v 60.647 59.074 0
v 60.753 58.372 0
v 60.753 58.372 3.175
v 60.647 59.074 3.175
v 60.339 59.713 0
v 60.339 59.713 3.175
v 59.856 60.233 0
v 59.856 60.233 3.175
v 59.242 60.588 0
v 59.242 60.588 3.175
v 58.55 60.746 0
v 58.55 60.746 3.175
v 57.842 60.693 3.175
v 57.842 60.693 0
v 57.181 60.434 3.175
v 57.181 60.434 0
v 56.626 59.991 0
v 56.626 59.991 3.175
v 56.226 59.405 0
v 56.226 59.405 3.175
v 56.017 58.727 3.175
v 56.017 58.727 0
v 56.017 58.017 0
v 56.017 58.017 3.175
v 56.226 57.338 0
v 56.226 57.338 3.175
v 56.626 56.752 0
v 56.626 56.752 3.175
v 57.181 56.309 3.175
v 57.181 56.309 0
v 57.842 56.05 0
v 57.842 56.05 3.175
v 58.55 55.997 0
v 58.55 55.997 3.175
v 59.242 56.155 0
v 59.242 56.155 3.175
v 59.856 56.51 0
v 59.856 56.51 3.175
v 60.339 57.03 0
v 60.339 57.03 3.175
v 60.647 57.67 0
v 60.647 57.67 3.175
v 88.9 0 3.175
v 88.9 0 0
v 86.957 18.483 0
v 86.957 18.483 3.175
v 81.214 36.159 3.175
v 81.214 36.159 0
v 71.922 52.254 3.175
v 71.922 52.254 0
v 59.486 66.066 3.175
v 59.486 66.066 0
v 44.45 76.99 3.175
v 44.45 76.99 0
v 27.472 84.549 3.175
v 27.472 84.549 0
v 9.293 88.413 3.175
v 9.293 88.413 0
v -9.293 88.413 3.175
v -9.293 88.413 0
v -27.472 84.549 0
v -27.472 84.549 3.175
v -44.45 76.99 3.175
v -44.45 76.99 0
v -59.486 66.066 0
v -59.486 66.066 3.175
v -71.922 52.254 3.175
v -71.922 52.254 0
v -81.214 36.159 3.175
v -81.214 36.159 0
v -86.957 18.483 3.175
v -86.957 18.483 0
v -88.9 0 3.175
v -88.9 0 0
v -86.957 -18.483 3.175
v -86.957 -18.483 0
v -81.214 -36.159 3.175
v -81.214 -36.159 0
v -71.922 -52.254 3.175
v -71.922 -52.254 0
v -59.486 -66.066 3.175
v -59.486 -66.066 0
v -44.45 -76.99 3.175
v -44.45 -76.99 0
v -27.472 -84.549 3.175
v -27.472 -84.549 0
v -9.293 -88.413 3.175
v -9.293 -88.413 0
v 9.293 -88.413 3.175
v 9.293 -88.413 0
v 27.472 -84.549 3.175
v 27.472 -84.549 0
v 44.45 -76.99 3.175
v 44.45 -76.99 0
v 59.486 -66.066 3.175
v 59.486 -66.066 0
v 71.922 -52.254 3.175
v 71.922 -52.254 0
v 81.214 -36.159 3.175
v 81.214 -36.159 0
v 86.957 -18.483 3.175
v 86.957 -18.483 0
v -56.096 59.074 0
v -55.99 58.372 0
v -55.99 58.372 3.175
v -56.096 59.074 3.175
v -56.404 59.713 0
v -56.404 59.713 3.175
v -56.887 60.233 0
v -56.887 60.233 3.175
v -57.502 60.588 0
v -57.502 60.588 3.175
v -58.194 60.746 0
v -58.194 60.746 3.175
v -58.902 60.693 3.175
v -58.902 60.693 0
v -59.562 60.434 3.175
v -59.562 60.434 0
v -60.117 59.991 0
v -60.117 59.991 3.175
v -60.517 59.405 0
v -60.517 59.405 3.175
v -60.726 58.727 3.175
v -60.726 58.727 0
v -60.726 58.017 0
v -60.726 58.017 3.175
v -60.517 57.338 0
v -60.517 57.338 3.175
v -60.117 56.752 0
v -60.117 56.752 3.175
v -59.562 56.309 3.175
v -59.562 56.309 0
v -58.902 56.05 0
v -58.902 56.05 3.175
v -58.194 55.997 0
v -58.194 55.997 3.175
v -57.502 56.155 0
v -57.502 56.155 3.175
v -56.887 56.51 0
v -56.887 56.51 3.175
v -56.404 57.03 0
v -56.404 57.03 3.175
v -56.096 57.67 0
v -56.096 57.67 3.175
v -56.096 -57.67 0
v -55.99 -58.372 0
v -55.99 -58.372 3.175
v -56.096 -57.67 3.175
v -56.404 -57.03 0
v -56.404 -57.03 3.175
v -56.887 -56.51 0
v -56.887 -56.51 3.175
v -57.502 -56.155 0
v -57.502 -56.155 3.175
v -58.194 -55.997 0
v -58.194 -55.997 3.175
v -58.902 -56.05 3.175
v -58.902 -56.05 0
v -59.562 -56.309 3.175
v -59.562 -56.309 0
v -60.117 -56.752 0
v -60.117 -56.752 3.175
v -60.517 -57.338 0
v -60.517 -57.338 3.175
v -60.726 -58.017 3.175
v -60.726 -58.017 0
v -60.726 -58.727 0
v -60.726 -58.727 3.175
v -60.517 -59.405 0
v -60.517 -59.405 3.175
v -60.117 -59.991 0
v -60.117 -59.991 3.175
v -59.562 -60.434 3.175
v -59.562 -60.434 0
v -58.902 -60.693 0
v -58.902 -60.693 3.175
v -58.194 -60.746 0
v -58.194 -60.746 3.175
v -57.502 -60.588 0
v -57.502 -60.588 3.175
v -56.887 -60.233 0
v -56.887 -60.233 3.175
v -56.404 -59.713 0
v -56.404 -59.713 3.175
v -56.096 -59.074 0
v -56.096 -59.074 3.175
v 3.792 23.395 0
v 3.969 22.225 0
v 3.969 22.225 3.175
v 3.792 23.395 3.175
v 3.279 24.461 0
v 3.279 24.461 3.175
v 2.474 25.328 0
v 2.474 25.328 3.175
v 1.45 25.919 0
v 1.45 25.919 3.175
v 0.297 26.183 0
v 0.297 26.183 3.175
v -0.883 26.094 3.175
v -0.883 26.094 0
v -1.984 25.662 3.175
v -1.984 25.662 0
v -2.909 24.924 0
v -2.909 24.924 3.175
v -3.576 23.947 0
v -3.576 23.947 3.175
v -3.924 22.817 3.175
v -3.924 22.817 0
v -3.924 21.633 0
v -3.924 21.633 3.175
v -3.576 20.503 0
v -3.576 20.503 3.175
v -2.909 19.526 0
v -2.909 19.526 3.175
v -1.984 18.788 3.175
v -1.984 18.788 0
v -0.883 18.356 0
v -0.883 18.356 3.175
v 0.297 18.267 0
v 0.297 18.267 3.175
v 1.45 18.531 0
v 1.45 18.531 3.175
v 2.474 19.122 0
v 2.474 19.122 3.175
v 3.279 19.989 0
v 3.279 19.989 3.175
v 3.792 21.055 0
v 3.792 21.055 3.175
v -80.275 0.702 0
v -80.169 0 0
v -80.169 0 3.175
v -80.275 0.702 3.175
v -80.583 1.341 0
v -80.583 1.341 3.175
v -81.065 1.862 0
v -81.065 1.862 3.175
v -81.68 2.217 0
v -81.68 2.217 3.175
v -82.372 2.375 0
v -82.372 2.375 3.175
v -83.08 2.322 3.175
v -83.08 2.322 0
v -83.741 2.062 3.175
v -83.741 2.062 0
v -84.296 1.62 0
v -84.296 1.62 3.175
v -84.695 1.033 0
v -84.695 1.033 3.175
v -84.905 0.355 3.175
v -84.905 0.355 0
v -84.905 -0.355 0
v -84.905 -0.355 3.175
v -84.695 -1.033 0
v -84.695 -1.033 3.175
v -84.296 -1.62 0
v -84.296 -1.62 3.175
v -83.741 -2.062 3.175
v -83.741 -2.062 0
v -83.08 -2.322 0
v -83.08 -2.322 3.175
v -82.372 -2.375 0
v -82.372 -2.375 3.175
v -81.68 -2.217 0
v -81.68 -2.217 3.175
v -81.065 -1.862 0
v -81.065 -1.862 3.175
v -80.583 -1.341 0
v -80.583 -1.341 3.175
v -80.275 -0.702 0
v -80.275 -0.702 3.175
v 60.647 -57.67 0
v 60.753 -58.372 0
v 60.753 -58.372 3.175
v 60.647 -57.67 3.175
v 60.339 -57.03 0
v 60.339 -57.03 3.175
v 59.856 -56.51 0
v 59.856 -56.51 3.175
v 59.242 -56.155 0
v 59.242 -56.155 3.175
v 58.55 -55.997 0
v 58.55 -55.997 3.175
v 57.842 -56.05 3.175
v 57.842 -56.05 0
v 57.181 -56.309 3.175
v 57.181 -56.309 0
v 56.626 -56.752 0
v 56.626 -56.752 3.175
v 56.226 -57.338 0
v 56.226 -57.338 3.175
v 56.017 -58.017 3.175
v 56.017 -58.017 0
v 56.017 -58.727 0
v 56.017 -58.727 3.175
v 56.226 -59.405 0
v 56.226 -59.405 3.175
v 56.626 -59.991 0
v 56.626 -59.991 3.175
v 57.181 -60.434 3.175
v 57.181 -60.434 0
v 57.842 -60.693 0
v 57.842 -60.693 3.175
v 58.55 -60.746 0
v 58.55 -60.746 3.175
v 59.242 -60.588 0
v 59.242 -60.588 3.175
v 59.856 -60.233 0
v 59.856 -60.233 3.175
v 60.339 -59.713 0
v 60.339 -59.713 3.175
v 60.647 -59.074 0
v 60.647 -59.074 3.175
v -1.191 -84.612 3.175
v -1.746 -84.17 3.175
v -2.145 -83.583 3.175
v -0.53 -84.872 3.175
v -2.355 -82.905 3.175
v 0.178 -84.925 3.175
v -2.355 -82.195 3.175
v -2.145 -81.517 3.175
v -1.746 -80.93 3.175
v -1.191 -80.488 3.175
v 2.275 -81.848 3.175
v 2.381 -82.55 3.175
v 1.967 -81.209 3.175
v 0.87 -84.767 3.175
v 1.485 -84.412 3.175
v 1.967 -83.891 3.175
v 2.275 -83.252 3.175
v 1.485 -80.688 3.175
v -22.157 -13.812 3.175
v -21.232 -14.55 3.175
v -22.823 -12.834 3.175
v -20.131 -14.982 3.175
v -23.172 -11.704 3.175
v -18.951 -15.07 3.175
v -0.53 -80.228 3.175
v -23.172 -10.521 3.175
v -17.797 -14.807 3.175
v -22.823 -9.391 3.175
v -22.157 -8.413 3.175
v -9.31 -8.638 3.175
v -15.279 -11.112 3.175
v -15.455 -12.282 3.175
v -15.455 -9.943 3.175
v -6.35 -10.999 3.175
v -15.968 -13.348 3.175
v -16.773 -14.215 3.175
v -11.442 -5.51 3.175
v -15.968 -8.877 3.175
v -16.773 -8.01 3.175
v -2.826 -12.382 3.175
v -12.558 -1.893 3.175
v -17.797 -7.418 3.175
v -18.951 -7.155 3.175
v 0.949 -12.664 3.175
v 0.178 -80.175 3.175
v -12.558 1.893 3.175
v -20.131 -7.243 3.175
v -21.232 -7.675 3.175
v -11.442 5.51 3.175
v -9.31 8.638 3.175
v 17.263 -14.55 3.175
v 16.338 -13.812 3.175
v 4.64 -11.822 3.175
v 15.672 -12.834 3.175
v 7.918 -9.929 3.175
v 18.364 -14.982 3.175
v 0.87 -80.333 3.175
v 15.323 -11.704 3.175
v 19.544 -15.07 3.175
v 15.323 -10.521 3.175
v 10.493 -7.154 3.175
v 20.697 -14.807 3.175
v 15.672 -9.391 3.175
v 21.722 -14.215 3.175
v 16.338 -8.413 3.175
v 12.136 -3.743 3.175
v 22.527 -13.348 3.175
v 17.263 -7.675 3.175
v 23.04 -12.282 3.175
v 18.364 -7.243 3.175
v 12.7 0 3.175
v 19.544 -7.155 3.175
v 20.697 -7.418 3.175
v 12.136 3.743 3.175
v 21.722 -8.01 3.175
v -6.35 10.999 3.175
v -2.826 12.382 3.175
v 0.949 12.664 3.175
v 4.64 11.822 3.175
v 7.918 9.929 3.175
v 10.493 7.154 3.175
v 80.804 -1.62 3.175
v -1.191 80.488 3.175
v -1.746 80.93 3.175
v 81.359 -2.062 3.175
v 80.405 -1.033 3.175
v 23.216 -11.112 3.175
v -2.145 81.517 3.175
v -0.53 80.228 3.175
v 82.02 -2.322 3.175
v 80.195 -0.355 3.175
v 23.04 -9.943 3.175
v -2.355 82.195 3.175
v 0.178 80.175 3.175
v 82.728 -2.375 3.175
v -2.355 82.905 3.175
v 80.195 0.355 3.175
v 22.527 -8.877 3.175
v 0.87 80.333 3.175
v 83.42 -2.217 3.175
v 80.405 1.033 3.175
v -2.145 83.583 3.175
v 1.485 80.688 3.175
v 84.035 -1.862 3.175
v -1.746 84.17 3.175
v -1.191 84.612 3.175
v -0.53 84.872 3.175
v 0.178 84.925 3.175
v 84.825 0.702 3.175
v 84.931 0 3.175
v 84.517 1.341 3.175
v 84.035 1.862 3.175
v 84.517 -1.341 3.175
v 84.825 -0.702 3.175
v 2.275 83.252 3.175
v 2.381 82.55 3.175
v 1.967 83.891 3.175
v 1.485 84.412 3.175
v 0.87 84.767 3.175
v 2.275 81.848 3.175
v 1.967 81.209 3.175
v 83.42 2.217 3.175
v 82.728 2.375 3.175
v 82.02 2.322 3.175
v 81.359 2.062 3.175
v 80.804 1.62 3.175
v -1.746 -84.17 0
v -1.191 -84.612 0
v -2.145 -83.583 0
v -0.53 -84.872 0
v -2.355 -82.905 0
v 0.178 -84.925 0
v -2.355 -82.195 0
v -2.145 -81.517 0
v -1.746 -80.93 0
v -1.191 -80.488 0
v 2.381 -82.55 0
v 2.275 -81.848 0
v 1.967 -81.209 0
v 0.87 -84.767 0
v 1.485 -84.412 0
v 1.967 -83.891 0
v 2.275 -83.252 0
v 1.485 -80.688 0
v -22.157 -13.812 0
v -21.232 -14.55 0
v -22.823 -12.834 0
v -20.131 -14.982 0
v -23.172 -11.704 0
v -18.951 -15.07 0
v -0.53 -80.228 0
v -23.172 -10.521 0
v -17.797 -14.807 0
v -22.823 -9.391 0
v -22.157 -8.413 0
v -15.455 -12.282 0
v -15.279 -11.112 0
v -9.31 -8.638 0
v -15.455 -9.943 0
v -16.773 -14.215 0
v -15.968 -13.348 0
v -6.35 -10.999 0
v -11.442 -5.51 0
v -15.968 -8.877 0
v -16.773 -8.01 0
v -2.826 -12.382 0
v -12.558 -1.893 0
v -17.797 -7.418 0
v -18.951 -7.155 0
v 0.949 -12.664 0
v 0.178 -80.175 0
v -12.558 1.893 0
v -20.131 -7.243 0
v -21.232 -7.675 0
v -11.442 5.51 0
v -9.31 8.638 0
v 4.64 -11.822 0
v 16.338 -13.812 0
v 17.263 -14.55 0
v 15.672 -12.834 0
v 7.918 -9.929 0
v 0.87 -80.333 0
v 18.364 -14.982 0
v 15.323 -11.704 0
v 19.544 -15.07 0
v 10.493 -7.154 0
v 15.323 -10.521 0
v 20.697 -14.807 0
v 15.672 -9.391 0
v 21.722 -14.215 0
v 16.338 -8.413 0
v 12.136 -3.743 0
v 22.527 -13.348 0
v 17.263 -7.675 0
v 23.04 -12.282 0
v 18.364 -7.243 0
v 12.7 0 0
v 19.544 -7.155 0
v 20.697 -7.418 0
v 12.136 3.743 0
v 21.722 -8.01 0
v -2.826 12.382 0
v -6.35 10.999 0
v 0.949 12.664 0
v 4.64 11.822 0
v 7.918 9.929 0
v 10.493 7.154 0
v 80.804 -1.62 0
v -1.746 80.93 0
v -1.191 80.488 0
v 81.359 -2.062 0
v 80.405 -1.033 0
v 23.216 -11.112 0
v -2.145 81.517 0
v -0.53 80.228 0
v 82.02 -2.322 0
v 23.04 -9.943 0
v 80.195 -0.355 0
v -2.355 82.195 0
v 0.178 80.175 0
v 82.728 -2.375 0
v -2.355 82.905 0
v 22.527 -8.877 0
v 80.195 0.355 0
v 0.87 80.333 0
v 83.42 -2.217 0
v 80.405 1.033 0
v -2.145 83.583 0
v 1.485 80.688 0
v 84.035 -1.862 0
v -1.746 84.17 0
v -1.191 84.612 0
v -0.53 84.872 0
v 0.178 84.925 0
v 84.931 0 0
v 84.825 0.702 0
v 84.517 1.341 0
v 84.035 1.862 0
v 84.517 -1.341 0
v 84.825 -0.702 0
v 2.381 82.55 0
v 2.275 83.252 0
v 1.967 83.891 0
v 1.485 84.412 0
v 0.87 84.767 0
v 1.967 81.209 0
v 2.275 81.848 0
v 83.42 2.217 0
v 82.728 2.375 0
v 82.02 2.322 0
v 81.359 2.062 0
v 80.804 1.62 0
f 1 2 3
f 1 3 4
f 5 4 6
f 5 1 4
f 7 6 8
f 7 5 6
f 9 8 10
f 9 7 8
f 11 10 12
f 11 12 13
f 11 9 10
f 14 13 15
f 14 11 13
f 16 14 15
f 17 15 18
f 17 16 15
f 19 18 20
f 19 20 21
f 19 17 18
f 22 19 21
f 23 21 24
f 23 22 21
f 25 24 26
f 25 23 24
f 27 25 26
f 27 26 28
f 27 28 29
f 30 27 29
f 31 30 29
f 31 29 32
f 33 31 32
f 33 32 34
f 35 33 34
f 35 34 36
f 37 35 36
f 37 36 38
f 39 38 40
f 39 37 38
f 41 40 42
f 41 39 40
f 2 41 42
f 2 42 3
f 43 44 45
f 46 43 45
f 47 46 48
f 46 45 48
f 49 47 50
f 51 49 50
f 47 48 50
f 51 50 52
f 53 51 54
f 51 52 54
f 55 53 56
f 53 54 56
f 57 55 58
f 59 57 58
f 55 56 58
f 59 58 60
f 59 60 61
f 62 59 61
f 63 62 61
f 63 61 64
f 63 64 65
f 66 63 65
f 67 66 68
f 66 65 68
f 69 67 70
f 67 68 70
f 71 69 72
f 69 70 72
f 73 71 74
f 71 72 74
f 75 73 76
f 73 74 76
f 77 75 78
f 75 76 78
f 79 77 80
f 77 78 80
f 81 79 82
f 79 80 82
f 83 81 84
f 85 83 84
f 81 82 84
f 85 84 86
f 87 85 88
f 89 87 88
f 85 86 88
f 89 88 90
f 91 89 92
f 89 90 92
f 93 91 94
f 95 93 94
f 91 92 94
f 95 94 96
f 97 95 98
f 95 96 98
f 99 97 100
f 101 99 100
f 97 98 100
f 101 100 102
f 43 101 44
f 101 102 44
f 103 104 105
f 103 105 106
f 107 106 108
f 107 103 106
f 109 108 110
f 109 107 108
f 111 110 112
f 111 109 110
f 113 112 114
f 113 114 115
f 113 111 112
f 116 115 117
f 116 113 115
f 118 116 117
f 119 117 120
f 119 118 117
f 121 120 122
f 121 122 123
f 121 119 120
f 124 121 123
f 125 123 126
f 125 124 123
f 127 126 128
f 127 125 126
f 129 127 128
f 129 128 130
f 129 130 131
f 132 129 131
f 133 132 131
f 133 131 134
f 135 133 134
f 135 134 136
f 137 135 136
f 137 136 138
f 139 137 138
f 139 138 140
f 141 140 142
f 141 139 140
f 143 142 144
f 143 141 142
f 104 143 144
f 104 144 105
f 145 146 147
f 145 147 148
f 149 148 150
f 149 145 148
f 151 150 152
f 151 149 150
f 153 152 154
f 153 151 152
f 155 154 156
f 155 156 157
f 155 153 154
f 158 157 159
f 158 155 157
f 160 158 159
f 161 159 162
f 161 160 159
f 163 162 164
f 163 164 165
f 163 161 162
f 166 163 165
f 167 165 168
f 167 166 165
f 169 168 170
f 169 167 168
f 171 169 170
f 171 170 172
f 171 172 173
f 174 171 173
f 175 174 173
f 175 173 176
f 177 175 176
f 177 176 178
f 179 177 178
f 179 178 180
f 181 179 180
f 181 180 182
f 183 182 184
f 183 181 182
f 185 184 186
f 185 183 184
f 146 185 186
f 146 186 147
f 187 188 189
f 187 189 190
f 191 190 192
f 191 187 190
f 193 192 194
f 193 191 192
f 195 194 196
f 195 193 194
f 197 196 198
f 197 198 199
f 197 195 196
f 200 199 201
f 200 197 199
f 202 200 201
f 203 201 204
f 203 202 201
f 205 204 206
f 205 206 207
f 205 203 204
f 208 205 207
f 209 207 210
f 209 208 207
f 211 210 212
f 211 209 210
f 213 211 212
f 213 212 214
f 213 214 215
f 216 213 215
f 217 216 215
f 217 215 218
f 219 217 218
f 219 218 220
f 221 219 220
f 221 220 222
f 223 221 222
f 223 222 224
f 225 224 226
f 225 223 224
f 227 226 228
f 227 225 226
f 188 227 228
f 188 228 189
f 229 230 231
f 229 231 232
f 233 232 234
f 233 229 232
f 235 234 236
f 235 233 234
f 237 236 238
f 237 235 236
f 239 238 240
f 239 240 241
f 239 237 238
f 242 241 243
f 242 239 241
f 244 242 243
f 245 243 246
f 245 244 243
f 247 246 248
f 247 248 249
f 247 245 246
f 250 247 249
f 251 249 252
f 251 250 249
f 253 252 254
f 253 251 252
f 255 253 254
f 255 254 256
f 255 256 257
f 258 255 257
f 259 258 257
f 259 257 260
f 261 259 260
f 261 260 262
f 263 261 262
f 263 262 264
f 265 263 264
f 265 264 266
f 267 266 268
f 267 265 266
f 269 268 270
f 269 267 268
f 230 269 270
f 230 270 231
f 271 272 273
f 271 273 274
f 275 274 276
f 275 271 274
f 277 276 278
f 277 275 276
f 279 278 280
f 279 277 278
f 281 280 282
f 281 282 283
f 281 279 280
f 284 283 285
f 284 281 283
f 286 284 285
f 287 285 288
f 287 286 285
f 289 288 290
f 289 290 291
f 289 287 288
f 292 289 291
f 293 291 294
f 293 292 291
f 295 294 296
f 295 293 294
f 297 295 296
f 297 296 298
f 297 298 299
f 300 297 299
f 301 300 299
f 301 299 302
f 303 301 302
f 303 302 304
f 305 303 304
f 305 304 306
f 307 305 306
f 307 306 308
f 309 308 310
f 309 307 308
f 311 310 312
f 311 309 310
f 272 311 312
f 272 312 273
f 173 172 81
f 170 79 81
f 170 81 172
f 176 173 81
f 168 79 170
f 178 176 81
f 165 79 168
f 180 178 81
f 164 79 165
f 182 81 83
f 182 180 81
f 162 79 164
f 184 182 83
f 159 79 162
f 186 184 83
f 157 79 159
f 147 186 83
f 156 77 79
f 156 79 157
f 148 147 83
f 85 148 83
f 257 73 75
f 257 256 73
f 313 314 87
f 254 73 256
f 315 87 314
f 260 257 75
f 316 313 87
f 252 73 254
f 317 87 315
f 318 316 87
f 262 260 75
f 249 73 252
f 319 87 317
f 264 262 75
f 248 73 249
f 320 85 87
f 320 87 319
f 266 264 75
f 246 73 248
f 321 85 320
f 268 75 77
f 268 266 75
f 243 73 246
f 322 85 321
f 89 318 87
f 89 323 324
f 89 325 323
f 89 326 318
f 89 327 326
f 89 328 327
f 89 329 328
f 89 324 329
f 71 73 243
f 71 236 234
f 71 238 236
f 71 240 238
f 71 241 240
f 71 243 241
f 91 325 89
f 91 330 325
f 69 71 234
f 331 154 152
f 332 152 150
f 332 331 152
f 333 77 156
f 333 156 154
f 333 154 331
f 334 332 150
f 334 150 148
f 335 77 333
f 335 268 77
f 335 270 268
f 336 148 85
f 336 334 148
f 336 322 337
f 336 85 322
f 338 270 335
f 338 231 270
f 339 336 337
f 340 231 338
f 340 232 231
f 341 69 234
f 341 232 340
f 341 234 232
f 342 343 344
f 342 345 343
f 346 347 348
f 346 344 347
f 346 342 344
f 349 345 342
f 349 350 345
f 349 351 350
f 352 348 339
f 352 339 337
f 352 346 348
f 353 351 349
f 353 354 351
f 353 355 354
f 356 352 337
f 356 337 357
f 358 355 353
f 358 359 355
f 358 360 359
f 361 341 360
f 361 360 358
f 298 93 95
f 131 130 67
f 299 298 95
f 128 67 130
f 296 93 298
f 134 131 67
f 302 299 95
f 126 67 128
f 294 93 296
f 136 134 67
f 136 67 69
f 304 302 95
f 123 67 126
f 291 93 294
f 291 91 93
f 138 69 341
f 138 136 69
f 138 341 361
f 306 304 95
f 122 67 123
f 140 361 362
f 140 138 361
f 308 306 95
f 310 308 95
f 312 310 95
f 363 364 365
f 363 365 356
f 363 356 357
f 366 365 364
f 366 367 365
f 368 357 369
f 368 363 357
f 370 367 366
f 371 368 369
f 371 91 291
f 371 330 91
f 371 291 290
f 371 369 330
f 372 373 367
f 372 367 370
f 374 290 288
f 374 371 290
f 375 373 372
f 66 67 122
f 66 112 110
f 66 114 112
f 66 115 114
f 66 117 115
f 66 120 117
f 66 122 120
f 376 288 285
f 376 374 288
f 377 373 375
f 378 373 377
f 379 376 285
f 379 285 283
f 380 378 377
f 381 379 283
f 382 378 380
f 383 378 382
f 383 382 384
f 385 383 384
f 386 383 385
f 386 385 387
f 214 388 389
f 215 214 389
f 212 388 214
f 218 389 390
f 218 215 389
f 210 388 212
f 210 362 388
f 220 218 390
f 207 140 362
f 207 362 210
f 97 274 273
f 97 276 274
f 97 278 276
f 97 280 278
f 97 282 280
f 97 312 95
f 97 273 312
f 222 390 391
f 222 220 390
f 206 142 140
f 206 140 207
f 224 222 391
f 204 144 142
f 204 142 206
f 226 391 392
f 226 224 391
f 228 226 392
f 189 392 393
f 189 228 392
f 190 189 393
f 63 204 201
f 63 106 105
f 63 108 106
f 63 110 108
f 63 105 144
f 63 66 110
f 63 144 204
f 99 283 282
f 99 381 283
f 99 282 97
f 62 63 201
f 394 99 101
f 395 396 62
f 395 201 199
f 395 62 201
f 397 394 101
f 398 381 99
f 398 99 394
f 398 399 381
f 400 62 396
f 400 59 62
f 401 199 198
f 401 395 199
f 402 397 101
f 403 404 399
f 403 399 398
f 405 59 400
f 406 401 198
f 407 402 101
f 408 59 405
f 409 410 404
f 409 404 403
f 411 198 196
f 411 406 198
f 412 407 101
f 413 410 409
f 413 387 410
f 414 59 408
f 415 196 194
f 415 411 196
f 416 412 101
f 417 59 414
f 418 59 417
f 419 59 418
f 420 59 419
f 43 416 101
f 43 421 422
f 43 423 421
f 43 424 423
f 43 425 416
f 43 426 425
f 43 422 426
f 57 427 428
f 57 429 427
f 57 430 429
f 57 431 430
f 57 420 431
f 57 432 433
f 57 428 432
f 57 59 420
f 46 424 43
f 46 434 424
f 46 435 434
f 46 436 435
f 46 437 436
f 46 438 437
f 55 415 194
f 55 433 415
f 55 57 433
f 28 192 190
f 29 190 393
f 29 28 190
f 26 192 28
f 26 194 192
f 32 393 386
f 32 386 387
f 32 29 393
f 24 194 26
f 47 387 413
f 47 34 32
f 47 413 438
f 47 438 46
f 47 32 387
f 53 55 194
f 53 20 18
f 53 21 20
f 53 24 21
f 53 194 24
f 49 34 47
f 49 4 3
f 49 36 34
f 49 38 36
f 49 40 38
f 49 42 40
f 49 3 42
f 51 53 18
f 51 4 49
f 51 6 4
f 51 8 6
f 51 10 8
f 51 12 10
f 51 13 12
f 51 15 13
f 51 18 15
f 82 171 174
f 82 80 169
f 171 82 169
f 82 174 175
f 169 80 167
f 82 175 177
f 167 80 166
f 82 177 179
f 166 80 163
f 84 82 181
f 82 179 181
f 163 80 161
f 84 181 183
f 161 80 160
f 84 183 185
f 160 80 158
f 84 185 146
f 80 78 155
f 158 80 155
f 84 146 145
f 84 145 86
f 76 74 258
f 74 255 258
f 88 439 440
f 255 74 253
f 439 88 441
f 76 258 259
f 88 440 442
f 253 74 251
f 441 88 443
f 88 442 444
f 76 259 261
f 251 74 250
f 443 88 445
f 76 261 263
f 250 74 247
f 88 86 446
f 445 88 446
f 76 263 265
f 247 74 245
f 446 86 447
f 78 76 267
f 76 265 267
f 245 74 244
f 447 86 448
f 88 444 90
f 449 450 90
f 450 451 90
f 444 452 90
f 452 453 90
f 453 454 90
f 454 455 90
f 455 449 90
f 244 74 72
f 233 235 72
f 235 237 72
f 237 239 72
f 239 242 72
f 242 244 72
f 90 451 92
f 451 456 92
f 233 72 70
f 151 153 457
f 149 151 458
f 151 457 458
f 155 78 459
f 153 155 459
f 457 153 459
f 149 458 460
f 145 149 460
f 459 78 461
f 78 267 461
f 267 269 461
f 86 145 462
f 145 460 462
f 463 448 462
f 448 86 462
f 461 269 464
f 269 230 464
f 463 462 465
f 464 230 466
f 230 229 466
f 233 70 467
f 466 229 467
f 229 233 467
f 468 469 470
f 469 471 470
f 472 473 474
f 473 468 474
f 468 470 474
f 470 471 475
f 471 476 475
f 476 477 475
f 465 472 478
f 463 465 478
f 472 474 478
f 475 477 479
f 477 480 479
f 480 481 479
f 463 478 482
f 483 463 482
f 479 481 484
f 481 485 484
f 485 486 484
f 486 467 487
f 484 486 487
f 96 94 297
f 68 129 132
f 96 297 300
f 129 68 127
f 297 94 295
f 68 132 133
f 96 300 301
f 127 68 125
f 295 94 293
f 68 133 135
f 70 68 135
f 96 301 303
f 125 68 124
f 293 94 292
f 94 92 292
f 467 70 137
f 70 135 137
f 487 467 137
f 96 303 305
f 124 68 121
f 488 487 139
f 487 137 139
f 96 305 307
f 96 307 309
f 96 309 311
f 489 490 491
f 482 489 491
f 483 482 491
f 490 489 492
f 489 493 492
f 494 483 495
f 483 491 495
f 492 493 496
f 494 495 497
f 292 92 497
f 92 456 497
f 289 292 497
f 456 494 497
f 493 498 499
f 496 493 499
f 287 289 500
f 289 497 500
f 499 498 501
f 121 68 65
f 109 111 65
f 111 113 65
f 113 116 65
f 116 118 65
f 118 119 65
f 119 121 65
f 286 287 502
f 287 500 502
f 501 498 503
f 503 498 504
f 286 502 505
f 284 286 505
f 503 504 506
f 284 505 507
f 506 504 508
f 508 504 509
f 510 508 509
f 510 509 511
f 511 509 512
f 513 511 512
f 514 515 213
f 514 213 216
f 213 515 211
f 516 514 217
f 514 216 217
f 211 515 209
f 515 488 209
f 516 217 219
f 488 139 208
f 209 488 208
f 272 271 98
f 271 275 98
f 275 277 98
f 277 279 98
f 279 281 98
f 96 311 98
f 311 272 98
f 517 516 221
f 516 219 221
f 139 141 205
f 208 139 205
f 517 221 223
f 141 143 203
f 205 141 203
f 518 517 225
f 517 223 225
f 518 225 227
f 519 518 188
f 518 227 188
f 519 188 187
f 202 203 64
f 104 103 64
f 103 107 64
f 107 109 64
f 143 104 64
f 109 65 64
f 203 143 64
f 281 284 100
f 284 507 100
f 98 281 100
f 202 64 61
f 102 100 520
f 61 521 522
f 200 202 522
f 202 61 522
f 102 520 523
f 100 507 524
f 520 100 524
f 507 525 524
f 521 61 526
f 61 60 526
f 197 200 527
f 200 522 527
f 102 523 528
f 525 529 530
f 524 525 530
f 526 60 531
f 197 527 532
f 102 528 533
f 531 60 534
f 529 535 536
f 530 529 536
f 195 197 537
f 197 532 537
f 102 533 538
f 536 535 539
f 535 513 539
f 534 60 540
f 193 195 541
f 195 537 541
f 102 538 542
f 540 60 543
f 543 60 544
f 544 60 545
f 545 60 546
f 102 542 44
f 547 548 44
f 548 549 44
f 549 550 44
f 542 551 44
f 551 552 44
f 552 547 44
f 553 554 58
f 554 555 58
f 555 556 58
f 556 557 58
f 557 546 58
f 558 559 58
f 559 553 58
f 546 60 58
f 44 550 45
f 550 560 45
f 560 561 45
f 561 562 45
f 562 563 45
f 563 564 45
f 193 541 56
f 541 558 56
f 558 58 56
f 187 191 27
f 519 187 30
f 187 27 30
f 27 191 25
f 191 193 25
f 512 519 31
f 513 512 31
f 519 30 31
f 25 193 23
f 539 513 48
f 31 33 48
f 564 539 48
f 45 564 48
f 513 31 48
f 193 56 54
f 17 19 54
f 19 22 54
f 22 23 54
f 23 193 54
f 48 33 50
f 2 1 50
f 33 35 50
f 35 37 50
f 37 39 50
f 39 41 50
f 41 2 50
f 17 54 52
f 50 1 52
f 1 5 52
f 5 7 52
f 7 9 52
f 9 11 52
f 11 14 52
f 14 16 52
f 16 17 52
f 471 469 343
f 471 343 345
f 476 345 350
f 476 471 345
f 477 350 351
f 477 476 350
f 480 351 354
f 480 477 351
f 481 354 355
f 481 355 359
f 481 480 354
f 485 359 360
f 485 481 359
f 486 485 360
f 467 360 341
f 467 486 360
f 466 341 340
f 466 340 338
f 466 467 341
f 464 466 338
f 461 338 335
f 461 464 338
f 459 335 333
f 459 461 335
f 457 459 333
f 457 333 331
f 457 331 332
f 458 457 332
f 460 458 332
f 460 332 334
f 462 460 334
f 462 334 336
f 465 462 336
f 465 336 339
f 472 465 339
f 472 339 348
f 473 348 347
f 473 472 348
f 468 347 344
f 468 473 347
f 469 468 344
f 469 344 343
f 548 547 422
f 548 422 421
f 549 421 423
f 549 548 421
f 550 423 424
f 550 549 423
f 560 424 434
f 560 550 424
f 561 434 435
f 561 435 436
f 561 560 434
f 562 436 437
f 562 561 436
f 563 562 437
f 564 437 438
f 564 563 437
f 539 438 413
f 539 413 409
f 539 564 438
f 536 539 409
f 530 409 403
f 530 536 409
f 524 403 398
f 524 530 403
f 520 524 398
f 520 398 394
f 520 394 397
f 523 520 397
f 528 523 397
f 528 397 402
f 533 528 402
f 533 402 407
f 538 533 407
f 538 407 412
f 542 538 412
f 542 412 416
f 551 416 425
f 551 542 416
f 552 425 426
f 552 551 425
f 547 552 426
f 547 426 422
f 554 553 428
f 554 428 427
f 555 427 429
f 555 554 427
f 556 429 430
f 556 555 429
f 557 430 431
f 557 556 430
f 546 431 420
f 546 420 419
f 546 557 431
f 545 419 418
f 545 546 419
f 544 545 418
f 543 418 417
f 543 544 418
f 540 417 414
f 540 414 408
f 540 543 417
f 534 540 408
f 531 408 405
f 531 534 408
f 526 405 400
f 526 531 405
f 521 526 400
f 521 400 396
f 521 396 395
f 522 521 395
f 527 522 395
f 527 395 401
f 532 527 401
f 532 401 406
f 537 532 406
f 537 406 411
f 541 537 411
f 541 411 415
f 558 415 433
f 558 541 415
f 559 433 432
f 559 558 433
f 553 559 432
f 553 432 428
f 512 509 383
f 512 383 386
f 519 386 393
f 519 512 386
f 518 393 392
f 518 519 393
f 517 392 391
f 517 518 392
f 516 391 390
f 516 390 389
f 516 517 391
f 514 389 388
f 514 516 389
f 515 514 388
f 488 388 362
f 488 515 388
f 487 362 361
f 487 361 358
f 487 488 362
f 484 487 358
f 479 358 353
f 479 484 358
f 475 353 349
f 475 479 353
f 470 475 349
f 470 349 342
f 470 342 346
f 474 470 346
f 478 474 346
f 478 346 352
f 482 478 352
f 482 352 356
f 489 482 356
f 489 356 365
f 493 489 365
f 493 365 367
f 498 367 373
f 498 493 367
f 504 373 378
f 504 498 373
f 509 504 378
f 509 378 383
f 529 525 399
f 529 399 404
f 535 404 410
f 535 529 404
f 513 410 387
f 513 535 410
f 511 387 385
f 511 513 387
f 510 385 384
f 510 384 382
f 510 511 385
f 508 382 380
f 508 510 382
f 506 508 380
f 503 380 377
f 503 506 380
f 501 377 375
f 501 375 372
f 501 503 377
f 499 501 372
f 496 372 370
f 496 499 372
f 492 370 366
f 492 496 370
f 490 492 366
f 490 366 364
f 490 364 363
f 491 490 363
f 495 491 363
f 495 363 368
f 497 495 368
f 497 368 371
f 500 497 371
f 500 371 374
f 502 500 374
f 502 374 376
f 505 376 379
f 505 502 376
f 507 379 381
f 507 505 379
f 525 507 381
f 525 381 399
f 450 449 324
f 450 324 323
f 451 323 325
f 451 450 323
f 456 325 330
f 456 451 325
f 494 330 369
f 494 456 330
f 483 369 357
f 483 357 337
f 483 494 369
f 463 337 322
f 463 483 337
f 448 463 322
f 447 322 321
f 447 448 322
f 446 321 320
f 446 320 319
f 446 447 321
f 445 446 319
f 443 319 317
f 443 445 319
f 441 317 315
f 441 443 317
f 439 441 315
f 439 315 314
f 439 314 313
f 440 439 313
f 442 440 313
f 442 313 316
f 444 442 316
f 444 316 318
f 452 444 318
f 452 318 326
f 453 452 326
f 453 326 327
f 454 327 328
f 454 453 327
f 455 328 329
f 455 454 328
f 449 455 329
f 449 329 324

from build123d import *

# Parameters (mm, degrees)
SKETCH1_R           = 88.9
SKETCH1_R_2         = 3.96875
SKETCH1_R_3         = 2.38125
SKETCH1_R_4         = 12.7
BOSS_EXTRUDE1_DEPTH = 3.175


with BuildPart() as part:
    # Sketch1 → Boss-Extrude1 (new body)
    with BuildSketch(Plane.XY):
        Circle(SKETCH1_R)
        with Locations((0, 22.225)):
            Circle(SKETCH1_R_2, mode=Mode.SUBTRACT)
        with Locations((19.247414599, -11.1125)):
            Circle(SKETCH1_R_2, mode=Mode.SUBTRACT)
        with Locations((-19.247414599, -11.1125)):
            Circle(SKETCH1_R_2, mode=Mode.SUBTRACT)
        with Locations((0, 82.55)):
            Circle(SKETCH1_R_3, mode=Mode.SUBTRACT)
        with Locations((58.371664787, 58.371664787)):
            Circle(SKETCH1_R_3, mode=Mode.SUBTRACT)
        with Locations((82.55, 0)):
            Circle(SKETCH1_R_3, mode=Mode.SUBTRACT)
        with Locations((58.371664787, -58.371664787)):
            Circle(SKETCH1_R_3, mode=Mode.SUBTRACT)
        with Locations((0, -82.55)):
            Circle(SKETCH1_R_3, mode=Mode.SUBTRACT)
        with Locations((-58.371664787, -58.371664787)):
            Circle(SKETCH1_R_3, mode=Mode.SUBTRACT)
        with Locations((-82.55, 0)):
            Circle(SKETCH1_R_3, mode=Mode.SUBTRACT)
        with Locations((-58.371664787, 58.371664787)):
            Circle(SKETCH1_R_3, mode=Mode.SUBTRACT)
        Circle(SKETCH1_R_4, mode=Mode.SUBTRACT)
    extrude(amount=BOSS_EXTRUDE1_DEPTH)


solid = part.part
